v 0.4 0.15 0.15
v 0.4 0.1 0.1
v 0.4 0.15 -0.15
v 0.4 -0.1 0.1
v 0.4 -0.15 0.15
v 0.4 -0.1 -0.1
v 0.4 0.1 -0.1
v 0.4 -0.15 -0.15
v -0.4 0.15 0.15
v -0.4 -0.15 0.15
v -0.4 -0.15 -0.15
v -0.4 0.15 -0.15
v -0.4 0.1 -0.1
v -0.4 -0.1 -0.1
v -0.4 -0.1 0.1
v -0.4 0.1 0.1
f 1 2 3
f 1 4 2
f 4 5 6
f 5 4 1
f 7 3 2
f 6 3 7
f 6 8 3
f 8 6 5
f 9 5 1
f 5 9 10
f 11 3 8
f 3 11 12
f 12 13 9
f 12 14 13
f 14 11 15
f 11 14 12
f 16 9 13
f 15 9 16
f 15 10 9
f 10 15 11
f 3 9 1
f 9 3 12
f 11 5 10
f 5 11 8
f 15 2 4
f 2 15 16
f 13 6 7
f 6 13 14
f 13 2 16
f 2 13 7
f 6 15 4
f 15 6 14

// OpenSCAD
// Long rectangular hollow prism (box-section tube) with centered through-opening
// Bounding box: 0.8 x 0.3 x 0.3 mm (elongated along X)

L = 0.8;
W = 0.3;
H = 0.3;
t = 0.05;          // uniform wall thickness

// Use a tiny epsilon (in mm) to guarantee a clean through-cut without changing the bounding box
eps = 0.001;

// Inner void dimensions (centered)
inner_L = L + 2*eps;     // extend past both ends to ensure a true through-opening
inner_W = W - 2*t;
inner_H = H - 2*t;

// Ensure valid wall thickness / non-degenerate inner void
assert(inner_W > 0 && inner_H > 0, "Wall thickness too large for given W/H.");

difference() {
    // Outer prism (featureless exterior)
    cube([L, W, H], center=true);

    // Centered rectangular through-void (box-section tube)
    // Slightly longer than outer to ensure the cut fully opens both ends
    cube([inner_L, inner_W, inner_H], center=true);
}
